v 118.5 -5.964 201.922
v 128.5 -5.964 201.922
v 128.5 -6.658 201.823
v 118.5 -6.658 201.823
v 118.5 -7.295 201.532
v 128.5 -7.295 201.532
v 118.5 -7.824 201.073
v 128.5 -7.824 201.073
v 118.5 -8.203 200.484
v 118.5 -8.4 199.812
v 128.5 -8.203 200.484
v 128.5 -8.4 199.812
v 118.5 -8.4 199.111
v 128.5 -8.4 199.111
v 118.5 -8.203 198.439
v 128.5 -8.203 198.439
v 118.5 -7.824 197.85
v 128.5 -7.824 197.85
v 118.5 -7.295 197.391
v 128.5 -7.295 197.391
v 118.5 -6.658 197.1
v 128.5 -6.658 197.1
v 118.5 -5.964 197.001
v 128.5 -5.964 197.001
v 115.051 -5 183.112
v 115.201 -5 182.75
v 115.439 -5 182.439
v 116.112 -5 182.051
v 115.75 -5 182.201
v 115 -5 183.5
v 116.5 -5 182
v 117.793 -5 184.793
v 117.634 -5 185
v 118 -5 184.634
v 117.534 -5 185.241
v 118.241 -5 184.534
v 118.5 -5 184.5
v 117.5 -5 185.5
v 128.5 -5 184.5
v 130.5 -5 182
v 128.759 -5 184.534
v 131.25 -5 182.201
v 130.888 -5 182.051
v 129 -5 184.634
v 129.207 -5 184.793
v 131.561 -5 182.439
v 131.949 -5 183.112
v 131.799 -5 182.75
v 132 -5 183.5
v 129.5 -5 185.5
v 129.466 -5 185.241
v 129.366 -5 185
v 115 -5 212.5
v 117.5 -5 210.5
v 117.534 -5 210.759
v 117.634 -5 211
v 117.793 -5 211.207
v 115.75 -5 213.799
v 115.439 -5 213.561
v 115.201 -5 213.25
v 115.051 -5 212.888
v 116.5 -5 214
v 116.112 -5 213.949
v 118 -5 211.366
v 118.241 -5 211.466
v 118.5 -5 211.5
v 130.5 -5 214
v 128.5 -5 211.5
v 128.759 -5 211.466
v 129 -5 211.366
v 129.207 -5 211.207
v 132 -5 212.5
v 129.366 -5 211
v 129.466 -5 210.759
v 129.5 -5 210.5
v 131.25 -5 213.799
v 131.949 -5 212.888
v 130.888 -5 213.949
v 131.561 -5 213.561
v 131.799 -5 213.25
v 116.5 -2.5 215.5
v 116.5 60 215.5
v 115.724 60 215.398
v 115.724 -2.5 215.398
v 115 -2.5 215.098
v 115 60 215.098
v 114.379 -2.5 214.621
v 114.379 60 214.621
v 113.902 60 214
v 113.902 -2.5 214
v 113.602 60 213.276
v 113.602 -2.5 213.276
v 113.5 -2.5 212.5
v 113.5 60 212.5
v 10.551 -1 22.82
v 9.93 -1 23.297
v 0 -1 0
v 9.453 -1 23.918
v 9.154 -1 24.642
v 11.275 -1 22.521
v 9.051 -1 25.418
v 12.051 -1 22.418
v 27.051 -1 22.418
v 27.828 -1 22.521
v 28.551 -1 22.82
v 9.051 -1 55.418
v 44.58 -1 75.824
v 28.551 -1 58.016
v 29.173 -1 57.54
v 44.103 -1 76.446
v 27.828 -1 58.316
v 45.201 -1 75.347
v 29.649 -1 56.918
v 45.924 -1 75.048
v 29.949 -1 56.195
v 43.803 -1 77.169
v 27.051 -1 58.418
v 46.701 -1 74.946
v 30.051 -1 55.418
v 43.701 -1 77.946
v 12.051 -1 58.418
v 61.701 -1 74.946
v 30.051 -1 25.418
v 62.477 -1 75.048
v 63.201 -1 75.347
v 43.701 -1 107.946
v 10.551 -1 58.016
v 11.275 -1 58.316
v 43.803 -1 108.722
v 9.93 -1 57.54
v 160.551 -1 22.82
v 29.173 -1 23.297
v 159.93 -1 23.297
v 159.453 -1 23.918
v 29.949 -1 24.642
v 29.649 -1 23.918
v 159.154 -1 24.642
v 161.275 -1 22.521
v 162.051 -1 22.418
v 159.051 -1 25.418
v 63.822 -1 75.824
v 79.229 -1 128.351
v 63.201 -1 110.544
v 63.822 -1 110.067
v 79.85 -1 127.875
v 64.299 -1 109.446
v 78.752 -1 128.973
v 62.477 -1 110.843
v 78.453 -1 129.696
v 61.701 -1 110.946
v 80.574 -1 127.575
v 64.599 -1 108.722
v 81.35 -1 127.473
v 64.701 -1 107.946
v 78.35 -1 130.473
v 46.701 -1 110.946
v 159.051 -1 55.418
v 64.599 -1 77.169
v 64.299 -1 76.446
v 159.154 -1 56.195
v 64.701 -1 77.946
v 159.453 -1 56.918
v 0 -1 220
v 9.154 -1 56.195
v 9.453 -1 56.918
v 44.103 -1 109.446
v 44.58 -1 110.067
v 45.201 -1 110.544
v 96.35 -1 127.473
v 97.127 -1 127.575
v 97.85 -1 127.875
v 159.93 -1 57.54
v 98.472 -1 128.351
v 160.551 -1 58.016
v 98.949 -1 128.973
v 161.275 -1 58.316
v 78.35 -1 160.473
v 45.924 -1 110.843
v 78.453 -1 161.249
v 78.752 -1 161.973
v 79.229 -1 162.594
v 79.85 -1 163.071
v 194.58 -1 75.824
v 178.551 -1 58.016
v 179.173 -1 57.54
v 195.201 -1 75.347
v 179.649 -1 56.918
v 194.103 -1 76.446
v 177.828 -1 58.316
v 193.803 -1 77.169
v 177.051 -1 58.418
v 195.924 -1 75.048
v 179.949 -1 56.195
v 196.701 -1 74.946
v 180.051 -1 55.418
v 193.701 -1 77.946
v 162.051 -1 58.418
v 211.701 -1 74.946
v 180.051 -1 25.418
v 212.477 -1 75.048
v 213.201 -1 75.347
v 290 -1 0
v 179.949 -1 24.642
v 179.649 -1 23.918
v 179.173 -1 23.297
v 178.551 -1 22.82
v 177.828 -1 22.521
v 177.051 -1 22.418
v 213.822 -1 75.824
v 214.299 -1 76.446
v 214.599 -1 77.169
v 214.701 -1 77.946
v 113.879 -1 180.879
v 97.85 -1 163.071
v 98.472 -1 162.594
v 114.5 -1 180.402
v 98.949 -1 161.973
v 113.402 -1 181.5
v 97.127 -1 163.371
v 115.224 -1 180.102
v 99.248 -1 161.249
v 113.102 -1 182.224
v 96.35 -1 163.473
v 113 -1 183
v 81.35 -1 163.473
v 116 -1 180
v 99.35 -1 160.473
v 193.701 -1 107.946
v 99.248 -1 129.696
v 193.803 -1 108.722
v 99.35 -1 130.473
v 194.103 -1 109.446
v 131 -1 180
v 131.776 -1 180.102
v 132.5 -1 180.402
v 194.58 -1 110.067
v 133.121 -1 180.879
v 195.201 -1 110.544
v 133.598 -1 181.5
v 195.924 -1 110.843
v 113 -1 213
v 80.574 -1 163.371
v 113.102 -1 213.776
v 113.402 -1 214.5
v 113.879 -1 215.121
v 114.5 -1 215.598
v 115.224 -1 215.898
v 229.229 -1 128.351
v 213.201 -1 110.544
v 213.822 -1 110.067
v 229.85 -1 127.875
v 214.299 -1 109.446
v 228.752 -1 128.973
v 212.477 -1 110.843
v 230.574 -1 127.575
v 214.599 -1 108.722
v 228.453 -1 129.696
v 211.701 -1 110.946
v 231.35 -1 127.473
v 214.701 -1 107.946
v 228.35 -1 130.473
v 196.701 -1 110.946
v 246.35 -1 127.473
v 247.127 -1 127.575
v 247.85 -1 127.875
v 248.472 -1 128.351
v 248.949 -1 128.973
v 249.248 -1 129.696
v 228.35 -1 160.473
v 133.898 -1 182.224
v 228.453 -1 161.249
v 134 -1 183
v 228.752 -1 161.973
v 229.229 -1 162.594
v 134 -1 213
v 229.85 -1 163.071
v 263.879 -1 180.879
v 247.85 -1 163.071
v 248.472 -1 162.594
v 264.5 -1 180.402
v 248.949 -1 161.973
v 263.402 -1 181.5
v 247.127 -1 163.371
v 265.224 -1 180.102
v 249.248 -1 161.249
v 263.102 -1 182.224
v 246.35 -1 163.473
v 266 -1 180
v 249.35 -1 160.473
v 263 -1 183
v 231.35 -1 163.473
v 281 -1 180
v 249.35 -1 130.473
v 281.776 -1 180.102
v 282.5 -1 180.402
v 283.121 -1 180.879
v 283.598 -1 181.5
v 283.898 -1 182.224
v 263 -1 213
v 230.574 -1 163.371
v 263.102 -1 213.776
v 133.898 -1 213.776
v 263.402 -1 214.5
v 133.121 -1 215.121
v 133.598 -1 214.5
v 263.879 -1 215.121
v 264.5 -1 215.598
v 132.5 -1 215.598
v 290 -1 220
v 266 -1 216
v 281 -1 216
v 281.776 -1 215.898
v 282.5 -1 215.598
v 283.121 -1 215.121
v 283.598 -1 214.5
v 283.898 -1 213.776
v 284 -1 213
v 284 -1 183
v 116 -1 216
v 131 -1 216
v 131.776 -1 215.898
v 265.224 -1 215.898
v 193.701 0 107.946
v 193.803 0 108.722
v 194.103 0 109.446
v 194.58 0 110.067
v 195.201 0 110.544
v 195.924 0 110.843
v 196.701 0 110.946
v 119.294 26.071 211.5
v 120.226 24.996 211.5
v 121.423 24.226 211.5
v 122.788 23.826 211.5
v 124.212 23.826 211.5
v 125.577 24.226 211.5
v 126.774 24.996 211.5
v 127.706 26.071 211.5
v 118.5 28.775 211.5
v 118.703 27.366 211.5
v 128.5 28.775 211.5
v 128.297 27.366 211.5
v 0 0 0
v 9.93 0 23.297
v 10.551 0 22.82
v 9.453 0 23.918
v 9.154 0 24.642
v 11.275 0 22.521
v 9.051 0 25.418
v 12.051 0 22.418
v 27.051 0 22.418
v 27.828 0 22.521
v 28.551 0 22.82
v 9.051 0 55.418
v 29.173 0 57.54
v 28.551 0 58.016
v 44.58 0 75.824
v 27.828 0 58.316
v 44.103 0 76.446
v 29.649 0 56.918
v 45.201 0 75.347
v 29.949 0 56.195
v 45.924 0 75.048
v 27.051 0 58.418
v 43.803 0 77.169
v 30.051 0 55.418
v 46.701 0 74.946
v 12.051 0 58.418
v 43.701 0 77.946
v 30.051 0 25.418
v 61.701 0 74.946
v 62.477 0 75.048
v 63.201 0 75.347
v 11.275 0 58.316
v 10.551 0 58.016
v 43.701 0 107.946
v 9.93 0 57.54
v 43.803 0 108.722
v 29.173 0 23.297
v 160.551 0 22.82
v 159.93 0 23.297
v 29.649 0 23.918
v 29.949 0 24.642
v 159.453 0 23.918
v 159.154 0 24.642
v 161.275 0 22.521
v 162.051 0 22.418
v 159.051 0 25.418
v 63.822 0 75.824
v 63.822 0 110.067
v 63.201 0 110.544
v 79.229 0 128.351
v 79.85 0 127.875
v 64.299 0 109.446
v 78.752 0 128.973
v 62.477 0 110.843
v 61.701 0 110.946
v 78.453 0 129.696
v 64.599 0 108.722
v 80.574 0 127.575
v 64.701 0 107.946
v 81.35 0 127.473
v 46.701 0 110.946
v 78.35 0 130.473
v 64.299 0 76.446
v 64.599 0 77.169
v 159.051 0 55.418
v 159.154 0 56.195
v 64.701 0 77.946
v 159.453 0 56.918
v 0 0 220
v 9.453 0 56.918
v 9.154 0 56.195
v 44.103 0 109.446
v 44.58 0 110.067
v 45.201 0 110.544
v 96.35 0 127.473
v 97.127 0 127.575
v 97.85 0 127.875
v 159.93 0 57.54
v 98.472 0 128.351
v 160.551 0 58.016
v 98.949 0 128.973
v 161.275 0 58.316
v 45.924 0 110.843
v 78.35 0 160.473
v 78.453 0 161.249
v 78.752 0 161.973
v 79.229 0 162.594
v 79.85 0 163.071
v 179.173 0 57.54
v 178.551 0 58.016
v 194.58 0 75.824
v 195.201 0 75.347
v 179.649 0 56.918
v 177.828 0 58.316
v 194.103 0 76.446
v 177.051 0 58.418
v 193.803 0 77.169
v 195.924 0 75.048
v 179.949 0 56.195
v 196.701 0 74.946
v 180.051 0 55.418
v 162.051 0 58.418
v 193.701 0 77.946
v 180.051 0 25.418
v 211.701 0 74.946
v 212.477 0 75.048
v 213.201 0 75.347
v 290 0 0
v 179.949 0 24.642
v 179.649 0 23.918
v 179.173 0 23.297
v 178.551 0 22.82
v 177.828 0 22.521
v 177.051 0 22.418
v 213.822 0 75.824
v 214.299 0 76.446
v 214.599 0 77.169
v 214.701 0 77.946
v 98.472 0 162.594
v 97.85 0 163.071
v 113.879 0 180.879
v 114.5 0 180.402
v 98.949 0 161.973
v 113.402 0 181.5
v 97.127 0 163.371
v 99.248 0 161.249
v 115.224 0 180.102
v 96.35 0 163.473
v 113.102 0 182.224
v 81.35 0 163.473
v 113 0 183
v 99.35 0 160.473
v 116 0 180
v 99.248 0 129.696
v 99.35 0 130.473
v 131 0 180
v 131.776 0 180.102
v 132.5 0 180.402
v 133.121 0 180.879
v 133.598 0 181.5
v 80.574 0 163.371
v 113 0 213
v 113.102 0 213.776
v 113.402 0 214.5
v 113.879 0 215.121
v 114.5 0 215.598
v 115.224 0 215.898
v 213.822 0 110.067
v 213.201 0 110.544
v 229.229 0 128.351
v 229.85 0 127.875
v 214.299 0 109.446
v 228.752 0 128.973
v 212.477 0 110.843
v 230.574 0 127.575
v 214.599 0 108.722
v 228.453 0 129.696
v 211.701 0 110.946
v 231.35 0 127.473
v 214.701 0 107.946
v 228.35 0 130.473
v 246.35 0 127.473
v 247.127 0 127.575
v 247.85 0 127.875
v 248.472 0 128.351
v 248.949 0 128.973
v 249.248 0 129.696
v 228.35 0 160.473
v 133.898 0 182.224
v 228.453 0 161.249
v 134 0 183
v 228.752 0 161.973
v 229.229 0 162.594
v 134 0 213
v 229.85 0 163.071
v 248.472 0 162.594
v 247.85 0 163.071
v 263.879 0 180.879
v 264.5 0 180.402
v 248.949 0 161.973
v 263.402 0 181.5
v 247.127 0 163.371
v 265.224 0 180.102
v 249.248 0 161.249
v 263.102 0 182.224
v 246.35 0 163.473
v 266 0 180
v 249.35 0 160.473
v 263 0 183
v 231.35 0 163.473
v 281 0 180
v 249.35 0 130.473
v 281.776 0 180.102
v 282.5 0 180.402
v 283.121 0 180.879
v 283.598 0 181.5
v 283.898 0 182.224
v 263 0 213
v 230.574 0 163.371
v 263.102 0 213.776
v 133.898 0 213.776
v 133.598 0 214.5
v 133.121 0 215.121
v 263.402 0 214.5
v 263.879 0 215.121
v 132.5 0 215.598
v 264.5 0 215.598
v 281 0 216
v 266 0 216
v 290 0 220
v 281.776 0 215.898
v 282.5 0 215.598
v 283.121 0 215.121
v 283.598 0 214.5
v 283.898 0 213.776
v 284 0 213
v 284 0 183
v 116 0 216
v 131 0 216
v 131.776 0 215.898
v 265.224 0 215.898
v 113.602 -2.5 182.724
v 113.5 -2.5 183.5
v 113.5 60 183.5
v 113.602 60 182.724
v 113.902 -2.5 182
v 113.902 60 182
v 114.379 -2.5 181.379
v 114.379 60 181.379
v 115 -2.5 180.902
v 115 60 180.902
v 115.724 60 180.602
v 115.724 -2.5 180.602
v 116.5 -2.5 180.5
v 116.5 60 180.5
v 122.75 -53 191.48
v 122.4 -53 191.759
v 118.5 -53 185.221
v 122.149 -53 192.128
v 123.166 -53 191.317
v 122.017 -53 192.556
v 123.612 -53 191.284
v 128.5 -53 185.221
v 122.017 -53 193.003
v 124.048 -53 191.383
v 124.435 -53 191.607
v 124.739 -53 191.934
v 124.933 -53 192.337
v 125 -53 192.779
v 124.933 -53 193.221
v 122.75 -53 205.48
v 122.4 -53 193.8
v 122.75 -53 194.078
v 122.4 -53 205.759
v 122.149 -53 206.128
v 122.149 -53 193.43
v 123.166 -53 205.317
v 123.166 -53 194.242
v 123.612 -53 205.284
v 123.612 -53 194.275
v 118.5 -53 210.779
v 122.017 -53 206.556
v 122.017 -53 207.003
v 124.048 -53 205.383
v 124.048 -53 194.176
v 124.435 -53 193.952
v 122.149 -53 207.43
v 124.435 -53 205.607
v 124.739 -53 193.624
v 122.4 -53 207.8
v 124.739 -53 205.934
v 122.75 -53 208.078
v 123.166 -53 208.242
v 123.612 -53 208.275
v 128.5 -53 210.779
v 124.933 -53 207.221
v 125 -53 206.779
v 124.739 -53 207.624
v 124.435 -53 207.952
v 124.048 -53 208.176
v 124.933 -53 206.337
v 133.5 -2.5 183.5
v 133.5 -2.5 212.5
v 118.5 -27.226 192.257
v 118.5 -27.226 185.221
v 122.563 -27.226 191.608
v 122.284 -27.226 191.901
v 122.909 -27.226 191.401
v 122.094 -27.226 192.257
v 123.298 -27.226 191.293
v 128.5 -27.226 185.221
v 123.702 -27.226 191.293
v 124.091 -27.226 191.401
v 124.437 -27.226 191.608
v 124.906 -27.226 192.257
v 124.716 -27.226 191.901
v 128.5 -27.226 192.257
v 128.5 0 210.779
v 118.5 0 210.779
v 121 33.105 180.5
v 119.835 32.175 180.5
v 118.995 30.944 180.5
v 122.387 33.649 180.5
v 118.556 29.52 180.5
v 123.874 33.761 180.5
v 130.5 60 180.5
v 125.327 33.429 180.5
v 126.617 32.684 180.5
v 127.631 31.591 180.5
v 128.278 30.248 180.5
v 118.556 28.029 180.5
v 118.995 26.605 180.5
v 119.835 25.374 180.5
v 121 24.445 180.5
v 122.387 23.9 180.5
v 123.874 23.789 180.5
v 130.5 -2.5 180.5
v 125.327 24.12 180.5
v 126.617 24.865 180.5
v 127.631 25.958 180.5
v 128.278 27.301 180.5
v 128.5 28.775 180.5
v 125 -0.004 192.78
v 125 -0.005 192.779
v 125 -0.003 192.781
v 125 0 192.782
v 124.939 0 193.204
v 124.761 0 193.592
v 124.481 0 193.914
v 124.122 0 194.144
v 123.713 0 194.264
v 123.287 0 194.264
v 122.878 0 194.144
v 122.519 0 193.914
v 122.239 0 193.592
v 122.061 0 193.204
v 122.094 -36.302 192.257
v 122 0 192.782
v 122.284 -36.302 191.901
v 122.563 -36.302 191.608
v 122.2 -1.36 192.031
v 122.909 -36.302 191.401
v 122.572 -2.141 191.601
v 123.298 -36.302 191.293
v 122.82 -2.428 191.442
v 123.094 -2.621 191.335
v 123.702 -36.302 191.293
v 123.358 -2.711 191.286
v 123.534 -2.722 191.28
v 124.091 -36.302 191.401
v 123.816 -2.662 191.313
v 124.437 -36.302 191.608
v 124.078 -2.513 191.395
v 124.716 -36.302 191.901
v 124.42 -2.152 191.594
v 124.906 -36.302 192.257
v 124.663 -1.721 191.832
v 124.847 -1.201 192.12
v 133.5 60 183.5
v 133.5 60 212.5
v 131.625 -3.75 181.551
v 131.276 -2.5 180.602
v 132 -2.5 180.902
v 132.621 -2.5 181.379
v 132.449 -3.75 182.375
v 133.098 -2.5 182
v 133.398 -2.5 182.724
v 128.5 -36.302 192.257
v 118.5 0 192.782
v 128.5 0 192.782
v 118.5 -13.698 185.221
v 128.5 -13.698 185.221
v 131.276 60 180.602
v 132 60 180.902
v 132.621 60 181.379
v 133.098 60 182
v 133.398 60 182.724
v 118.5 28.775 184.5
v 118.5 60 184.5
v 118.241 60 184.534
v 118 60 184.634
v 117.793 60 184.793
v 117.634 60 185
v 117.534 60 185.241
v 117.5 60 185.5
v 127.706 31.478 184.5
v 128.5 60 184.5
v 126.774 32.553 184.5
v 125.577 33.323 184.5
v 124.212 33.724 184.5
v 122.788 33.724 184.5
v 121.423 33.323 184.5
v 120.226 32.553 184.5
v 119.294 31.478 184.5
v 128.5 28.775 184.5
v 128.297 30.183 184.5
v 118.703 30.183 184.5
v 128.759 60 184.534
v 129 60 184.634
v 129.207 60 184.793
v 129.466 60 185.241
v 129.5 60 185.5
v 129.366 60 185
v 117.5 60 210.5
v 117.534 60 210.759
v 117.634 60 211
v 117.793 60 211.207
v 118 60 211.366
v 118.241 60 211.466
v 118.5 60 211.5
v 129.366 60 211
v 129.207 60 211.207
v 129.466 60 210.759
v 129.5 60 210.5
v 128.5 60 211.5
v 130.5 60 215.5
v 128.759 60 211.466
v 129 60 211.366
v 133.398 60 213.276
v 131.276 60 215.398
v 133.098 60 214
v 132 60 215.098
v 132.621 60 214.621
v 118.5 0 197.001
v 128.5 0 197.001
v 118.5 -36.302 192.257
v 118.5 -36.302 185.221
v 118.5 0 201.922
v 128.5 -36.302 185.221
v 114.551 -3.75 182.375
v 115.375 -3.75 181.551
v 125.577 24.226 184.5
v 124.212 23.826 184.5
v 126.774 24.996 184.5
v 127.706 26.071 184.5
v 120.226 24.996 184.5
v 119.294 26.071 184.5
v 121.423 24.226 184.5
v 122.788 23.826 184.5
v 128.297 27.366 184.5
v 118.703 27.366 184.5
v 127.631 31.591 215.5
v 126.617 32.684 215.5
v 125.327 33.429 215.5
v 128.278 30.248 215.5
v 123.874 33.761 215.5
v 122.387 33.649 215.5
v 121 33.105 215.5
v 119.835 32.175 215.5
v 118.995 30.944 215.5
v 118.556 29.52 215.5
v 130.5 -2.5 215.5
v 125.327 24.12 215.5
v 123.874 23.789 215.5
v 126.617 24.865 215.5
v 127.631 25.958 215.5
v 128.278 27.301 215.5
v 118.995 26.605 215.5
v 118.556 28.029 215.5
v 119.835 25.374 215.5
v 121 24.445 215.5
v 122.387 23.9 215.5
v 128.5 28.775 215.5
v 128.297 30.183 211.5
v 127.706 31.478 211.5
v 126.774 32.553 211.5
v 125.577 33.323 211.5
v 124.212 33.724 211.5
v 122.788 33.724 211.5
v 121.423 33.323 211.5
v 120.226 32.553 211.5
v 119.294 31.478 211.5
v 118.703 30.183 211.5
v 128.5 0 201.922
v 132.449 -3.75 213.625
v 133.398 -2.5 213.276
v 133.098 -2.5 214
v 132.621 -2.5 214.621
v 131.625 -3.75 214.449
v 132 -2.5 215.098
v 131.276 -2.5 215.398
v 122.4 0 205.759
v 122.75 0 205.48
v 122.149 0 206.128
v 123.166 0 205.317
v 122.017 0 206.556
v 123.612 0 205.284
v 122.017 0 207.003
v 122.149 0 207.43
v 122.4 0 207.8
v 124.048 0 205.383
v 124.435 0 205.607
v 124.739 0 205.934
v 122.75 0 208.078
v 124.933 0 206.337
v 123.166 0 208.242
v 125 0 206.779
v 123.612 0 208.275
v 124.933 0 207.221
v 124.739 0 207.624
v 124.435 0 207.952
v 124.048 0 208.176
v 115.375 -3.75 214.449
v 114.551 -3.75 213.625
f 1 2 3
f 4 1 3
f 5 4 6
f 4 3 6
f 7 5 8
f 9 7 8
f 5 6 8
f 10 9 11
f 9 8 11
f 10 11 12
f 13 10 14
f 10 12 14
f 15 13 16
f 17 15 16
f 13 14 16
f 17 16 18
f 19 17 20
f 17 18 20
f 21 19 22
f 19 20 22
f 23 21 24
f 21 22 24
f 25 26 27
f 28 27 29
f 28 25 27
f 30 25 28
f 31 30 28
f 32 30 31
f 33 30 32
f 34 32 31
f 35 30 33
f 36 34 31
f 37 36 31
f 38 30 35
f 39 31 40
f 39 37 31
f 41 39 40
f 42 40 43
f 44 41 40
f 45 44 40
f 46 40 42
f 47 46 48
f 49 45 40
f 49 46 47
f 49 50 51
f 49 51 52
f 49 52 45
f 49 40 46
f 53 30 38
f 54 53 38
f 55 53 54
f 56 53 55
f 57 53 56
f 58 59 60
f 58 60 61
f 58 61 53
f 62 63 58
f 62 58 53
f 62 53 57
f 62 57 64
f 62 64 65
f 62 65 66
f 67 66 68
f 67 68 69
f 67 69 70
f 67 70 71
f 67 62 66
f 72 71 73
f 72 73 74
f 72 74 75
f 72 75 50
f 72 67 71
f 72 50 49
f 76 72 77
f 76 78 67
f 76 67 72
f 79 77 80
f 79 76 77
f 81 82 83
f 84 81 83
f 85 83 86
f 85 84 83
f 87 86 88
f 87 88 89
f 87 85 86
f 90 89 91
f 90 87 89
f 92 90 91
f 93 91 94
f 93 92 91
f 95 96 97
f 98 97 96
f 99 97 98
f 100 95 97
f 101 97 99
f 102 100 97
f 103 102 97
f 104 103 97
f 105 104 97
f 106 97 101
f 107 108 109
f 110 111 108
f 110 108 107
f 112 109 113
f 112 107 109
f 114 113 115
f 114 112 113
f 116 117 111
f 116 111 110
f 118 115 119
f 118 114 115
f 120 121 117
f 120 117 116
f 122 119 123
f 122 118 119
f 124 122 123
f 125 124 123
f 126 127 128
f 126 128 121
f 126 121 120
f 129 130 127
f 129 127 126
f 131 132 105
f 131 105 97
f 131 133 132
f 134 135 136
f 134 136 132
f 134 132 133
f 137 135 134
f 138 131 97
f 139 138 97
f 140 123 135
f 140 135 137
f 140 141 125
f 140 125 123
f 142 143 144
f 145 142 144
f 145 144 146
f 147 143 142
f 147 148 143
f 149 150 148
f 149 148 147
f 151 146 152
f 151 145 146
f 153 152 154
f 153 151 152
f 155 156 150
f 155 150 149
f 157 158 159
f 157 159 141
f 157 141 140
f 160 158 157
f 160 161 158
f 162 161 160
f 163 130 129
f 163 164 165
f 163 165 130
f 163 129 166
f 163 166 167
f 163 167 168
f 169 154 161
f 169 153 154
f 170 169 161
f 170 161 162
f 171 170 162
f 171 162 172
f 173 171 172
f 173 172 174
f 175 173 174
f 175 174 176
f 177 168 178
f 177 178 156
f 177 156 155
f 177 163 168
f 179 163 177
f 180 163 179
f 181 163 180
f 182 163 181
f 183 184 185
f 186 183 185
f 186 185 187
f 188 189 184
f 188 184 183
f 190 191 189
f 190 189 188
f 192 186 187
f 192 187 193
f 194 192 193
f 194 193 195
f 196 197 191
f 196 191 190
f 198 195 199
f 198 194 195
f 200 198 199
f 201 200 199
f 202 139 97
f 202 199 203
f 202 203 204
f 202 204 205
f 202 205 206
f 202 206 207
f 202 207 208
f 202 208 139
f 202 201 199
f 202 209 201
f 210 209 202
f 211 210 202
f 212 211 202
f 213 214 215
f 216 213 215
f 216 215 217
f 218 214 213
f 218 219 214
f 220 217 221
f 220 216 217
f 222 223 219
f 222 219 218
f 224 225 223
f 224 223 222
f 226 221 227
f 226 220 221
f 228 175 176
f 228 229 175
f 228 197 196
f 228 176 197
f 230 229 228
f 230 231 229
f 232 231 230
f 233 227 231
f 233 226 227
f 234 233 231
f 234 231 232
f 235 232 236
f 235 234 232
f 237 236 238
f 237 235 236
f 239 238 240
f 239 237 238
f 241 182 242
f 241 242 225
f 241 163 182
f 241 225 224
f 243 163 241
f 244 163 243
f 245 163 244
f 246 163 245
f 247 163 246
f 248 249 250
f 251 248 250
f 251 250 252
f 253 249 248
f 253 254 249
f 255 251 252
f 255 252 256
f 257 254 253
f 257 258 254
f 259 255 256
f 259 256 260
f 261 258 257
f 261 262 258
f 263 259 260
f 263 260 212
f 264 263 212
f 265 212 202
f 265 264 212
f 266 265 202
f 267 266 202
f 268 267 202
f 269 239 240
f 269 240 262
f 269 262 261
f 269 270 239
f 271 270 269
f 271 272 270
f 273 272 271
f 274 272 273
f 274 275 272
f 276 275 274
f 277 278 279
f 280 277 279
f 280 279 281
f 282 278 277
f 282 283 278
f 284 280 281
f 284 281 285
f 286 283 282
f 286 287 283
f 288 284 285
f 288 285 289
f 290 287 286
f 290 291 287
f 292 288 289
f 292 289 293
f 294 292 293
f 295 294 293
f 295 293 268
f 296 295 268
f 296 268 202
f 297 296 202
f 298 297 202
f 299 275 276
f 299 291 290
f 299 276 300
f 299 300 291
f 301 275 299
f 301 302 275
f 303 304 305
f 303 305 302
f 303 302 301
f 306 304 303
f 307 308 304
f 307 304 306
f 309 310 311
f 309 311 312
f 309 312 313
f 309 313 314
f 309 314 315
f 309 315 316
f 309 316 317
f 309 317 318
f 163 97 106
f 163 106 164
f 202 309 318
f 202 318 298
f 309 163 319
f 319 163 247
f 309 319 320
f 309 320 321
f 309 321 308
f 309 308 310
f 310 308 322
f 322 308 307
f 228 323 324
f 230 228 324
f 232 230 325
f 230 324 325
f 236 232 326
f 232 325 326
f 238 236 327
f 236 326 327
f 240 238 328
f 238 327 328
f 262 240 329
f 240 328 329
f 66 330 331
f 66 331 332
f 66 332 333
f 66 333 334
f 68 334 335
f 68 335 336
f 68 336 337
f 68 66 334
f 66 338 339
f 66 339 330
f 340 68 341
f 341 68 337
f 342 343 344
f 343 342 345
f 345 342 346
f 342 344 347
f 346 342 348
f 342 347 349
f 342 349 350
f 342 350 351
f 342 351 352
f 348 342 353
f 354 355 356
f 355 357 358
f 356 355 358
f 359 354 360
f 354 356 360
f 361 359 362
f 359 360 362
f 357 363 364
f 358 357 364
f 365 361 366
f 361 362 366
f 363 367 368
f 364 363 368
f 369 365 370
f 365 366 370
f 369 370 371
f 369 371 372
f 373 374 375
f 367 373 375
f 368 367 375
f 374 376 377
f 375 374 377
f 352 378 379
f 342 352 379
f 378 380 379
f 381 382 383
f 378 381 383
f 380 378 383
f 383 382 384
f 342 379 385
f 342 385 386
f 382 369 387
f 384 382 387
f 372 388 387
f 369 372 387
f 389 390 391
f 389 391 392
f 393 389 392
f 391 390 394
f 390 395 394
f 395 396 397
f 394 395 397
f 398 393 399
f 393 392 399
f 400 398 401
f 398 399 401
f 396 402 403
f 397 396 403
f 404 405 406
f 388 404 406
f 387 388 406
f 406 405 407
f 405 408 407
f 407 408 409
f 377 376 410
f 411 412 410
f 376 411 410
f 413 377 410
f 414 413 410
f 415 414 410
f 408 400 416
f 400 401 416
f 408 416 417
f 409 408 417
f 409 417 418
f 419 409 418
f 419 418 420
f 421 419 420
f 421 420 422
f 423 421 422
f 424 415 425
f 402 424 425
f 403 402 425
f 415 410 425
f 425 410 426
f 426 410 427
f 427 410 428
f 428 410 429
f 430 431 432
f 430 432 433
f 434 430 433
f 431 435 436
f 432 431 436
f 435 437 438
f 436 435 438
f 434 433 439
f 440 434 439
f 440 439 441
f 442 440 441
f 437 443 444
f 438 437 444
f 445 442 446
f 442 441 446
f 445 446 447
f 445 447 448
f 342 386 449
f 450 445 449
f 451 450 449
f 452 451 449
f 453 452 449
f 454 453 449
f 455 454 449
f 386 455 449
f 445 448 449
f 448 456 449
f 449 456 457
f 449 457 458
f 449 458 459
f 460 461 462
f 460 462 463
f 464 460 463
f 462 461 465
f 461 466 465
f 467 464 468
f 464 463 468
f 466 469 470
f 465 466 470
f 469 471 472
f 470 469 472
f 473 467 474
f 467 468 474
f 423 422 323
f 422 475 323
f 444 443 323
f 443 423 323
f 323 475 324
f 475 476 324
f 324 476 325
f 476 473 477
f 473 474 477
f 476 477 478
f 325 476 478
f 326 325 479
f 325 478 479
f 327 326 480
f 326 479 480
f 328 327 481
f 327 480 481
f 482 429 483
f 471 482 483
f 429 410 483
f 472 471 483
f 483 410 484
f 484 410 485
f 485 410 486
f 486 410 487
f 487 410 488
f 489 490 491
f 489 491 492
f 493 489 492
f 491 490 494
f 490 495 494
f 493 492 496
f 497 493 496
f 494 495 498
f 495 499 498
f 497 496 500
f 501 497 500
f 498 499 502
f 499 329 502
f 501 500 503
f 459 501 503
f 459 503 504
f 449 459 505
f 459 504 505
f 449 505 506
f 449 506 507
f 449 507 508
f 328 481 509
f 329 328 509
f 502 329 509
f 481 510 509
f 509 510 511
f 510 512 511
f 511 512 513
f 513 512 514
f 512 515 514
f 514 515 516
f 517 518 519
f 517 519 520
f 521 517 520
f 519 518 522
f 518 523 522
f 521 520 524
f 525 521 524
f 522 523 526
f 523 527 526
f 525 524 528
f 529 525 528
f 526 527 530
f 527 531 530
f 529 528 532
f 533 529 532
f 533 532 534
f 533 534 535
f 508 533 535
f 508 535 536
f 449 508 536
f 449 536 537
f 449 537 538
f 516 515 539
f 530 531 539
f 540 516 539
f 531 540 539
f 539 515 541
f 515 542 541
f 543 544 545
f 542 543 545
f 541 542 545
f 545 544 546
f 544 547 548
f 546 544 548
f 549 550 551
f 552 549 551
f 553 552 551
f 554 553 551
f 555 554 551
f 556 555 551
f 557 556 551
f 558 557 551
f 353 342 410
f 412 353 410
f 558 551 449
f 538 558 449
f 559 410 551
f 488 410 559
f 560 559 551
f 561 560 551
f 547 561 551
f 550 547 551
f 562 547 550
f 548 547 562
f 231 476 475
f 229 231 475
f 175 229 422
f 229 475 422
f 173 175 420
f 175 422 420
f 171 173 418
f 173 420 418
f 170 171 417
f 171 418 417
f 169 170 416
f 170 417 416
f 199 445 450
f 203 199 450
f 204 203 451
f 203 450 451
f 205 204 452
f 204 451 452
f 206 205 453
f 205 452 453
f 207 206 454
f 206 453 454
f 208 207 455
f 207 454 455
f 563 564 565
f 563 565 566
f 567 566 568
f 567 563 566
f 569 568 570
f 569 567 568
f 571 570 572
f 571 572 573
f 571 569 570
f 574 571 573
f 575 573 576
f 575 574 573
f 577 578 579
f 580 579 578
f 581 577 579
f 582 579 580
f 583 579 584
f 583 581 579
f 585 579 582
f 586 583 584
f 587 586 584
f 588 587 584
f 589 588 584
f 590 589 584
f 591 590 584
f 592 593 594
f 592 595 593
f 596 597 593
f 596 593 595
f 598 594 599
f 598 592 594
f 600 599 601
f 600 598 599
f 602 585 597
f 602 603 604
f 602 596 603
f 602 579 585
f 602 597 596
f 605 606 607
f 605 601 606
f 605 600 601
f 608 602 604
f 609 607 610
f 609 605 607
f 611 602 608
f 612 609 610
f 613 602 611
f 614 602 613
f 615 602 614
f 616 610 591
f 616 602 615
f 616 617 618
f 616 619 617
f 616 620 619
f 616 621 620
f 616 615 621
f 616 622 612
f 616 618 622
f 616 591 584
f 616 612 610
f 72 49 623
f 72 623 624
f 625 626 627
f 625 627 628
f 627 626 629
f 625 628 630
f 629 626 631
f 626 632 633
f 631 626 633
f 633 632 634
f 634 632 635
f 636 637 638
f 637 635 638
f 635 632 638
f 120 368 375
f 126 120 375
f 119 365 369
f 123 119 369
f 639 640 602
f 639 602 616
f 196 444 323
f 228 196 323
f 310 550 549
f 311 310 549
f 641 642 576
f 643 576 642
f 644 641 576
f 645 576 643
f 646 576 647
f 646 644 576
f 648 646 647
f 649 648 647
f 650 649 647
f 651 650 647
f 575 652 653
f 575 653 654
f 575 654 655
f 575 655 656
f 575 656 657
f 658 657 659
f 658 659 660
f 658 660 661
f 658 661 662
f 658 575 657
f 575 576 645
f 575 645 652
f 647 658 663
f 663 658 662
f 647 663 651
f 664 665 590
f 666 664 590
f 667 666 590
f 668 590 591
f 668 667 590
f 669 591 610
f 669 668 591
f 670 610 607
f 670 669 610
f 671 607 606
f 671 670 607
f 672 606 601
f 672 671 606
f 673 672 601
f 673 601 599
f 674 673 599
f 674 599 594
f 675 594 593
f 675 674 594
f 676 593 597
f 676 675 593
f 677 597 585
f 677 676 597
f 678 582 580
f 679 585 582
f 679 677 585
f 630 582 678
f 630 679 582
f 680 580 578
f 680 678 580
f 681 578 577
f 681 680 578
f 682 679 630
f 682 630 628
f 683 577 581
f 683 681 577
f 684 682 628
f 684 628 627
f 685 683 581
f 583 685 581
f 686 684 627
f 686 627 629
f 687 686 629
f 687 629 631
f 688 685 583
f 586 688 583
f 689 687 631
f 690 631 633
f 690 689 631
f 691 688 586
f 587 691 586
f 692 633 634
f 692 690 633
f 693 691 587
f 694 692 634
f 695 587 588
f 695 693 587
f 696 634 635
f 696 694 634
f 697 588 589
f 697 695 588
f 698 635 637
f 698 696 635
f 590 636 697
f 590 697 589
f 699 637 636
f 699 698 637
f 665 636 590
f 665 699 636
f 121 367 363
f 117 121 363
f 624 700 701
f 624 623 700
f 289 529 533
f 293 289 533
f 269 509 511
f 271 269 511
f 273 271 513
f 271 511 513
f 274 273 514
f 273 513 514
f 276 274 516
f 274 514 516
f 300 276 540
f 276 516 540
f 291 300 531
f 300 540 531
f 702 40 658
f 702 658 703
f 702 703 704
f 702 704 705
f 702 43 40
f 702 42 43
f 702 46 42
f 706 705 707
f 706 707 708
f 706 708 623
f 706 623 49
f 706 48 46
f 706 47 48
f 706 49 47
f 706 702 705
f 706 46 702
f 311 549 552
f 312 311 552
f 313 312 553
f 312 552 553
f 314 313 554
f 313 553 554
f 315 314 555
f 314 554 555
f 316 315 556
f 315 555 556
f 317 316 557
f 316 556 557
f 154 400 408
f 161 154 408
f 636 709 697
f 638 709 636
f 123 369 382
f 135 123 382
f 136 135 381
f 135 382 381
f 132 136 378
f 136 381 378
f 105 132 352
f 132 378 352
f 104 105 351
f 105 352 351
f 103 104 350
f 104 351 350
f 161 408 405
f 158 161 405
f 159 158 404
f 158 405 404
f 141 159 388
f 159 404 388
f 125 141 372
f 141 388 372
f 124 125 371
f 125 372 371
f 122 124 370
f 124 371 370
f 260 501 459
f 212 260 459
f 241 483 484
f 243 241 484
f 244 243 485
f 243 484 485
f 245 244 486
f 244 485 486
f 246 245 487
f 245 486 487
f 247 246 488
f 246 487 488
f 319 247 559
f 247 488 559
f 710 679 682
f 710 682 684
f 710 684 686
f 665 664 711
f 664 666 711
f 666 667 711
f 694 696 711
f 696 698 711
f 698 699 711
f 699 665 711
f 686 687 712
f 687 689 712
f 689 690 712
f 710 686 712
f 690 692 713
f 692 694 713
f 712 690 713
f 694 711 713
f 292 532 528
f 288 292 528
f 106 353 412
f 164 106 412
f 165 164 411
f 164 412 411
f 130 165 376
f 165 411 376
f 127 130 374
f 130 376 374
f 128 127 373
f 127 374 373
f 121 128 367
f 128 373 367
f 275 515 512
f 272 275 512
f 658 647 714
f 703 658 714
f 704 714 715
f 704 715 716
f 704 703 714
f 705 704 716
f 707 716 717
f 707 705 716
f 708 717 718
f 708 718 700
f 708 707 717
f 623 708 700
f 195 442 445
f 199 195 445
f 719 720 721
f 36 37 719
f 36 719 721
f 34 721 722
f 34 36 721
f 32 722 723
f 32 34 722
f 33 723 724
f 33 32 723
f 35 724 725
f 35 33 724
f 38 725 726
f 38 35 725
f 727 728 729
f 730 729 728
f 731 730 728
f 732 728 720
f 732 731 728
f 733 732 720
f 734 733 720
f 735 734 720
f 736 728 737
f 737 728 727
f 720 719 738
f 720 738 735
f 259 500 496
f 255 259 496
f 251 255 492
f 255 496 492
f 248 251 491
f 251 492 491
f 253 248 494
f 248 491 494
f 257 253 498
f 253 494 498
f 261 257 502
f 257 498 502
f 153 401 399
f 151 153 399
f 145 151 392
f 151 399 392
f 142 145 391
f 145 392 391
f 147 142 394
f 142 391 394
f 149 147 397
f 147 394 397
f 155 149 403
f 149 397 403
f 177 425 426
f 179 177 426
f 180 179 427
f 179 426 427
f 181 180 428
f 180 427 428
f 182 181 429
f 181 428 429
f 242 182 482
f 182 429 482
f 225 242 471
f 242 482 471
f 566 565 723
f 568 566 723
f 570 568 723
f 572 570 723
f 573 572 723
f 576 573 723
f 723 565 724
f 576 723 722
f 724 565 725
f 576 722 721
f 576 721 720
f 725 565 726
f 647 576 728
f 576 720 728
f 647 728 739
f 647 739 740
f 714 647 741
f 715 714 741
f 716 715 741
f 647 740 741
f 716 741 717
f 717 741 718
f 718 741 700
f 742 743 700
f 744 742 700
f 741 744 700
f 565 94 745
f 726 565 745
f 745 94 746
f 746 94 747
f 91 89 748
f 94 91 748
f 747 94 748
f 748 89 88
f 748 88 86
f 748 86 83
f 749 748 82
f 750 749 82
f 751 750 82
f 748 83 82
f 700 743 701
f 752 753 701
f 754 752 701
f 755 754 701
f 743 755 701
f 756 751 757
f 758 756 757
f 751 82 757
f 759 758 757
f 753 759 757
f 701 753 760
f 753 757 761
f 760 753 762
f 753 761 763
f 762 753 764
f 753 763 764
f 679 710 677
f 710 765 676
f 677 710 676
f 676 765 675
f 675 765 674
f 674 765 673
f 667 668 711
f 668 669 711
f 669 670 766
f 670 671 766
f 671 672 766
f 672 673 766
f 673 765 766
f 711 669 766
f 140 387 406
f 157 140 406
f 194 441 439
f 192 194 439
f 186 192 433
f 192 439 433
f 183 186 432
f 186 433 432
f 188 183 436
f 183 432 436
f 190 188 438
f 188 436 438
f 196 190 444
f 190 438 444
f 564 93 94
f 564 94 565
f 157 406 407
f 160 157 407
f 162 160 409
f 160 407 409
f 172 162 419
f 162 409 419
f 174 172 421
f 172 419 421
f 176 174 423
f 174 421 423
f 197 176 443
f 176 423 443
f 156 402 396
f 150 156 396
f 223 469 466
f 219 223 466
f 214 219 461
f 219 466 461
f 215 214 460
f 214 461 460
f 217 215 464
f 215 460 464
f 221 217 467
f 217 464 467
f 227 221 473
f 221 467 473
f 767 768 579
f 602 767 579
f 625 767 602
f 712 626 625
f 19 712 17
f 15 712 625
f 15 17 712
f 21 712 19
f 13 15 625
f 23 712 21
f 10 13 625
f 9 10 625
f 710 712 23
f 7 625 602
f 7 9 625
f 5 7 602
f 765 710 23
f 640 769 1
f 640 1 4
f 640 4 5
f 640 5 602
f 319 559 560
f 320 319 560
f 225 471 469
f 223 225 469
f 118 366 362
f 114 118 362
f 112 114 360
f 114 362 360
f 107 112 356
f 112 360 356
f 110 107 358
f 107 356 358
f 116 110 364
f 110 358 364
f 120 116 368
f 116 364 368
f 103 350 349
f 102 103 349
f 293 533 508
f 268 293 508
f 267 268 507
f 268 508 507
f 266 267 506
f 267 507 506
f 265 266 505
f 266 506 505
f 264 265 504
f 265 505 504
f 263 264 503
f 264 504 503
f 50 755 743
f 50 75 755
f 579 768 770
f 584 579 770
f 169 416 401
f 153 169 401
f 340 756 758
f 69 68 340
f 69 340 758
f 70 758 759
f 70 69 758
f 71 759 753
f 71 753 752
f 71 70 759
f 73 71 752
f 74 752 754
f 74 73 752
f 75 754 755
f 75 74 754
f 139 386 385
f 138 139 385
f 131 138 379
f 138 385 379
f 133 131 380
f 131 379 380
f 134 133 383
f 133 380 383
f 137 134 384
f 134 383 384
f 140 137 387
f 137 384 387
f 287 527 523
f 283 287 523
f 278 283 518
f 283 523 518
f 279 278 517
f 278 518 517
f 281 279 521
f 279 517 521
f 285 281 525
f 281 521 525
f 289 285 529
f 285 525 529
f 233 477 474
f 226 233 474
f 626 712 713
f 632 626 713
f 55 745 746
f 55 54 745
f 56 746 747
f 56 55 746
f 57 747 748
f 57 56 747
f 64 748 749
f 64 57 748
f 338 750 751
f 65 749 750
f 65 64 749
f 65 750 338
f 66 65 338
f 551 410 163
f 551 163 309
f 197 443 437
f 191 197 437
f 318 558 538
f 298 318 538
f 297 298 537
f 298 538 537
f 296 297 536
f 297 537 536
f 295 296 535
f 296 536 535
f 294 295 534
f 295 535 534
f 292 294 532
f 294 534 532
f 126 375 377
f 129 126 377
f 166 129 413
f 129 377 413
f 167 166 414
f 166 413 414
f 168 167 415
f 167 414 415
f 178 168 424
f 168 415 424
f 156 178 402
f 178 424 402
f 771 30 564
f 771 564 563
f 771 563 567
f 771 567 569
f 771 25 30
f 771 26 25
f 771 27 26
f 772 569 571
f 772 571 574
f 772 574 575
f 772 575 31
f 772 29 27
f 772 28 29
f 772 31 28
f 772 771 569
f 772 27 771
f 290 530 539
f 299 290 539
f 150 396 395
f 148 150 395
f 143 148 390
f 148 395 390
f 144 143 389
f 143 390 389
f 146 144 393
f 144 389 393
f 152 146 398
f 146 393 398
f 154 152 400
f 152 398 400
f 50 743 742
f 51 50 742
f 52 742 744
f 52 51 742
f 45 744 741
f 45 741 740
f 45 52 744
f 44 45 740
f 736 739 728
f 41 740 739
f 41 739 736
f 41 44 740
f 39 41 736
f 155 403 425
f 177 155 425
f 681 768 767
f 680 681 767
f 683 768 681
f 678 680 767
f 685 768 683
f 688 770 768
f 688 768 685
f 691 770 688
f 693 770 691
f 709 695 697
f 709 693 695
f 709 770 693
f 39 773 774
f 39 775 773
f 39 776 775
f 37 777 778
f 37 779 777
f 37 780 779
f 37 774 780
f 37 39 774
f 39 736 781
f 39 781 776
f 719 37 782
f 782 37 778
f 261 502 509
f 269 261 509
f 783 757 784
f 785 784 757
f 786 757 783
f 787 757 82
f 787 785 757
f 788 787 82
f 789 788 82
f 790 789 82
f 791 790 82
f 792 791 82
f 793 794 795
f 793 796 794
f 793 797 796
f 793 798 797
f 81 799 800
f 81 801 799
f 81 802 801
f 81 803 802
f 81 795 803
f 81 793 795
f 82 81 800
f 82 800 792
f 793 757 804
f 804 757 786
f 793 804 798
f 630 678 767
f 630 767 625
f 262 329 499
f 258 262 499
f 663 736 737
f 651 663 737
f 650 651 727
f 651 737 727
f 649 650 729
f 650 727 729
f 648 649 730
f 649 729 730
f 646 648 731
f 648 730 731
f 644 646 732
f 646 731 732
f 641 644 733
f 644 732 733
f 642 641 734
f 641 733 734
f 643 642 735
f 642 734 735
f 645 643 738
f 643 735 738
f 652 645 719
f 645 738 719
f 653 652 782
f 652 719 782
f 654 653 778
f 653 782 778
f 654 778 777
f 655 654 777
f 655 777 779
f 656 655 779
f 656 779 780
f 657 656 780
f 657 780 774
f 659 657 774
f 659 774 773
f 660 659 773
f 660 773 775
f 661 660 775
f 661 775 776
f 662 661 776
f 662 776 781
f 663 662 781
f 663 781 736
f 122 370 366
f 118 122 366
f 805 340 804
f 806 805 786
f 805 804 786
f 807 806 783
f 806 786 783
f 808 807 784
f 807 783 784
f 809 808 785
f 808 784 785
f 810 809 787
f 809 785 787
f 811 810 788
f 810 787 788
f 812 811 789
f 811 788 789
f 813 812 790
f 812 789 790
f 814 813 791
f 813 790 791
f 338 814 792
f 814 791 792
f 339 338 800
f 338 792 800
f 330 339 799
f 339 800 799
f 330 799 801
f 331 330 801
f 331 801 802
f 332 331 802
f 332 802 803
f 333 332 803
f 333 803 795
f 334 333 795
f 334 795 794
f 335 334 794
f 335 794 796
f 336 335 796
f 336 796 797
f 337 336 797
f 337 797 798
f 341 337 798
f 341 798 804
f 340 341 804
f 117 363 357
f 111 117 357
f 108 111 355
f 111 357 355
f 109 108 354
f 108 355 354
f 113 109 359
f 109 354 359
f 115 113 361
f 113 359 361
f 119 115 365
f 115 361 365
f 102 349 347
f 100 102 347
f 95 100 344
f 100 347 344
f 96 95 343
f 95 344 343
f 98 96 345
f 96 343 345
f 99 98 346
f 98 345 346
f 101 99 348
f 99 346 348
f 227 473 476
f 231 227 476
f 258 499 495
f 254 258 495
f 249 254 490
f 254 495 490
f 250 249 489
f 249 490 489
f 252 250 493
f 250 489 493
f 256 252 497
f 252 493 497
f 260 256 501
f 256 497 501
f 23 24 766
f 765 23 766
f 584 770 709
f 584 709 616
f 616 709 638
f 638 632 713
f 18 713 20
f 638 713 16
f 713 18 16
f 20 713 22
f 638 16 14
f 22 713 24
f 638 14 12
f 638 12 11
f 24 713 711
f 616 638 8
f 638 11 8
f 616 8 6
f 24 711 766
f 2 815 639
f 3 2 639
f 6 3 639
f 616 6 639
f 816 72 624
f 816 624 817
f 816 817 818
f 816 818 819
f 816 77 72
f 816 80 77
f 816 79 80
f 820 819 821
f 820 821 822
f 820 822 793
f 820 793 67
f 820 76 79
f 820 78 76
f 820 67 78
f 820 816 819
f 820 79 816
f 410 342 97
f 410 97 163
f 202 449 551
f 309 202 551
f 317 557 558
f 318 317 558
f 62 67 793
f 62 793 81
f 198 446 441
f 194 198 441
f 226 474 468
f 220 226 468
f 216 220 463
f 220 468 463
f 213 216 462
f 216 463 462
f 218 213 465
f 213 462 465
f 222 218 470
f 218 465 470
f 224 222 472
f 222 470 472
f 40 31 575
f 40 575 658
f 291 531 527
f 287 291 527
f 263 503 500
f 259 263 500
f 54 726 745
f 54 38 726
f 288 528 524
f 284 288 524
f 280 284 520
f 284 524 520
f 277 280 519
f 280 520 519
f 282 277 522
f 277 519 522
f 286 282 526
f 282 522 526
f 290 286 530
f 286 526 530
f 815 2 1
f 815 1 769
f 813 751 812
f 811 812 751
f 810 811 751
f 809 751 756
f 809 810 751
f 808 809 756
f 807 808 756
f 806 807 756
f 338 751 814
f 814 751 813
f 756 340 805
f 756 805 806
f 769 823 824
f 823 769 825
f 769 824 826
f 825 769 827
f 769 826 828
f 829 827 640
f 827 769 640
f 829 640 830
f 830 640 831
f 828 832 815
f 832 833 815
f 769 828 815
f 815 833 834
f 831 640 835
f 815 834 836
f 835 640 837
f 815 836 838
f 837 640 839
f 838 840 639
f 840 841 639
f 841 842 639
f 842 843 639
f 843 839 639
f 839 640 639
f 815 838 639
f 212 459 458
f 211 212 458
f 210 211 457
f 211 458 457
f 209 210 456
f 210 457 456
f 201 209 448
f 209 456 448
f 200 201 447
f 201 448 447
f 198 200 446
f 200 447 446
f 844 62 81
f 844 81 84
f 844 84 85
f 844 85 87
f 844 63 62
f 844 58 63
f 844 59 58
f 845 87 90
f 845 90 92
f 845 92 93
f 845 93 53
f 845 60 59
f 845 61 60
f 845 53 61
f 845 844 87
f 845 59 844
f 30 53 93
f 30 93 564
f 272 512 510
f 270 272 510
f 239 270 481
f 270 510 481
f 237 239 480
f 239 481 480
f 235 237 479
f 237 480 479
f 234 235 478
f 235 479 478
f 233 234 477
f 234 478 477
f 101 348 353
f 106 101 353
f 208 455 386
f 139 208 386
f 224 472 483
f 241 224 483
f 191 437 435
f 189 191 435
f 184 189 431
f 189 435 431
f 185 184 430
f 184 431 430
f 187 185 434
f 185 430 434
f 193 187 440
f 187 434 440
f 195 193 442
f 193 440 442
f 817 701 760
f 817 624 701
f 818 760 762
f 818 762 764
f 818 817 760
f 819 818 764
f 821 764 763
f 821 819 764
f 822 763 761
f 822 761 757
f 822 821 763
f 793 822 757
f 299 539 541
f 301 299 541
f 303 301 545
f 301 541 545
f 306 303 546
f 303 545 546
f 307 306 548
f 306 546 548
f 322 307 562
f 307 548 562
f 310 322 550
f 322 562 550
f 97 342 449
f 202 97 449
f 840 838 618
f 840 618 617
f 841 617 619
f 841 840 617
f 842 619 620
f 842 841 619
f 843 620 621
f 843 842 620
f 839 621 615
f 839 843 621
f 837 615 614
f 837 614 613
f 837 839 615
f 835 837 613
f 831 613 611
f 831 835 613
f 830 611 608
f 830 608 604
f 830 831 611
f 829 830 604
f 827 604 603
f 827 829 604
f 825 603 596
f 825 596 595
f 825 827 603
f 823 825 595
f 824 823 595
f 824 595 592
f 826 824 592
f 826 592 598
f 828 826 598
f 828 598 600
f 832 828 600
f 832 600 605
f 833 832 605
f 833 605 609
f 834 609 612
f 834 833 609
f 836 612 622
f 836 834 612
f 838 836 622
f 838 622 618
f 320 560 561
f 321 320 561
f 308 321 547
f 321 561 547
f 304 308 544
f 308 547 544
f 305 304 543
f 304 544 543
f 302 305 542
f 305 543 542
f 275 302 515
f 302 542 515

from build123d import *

# Parameters (mm, degrees)
F0_W      = 290
F0_H      = 220
F1_DEPTH  = 1
F3_DEPTH  = 5
F4_SIZE2  = 1.5
F4_SIZE   = 2.5
F5_DEPTH  = 60
F6_R      = 5
F7_DEPTH  = 35
F11_W     = 10
F11_H     = 25.5586259929
F11_R     = 1.5
F8_DEPTH  = 53
F9_W      = 9.0754777193
F9_H      = 7.0361659809
F9_W_2    = 5.9644267894
F9_H_2    = 4.9215108156
F10_DEPTH = 10


with BuildPart() as f1:
    # F0 (on Front) → F1 (new body)
    with BuildSketch(Plane.XZ):
        with Locations((145, 110)):
            Rectangle(F0_W, F0_H)
        with BuildLine():
            ThreePointArc((27.05129, 58.41831), (29.1726103436, 57.5396303436), (30.05129, 55.41831))
            Line((30.05129, 55.41831), (30.05129, 25.41831))
            ThreePointArc((30.05129, 25.41831), (29.1726103436, 23.2969896564), (27.05129, 22.41831))
            Line((27.05129, 22.41831), (12.05129, 22.41831))
            ThreePointArc((12.05129, 22.41831), (9.9299696564, 23.2969896564), (9.05129, 25.41831))
            Line((9.05129, 25.41831), (9.05129, 55.41831))
            ThreePointArc((9.05129, 55.41831), (9.9299696564, 57.5396303436), (12.05129, 58.41831))
            Line((12.05129, 58.41831), (27.05129, 58.41831))
        make_face(mode=Mode.SUBTRACT)
        with BuildLine():
            Line((43.70086, 77.94554), (43.70086, 107.94554))
            ThreePointArc((43.70086, 107.94554), (44.5795396564, 110.0668603436), (46.70086, 110.94554))
            Line((46.70086, 110.94554), (61.70086, 110.94554))
            ThreePointArc((61.70086, 110.94554), (63.8221803436, 110.0668603436), (64.70086, 107.94554))
            Line((64.70086, 107.94554), (64.70086, 77.94554))
            ThreePointArc((64.70086, 77.94554), (63.8221803436, 75.8242196564), (61.70086, 74.94554))
            Line((61.70086, 74.94554), (46.70086, 74.94554))
            ThreePointArc((46.70086, 74.94554), (44.5795396564, 75.8242196564), (43.70086, 77.94554))
        make_face(mode=Mode.SUBTRACT)
        with BuildLine():
            ThreePointArc((177.05129, 58.41831), (179.1726103436, 57.5396303436), (180.05129, 55.41831))
            Line((180.05129, 55.41831), (180.05129, 25.41831))
            ThreePointArc((180.05129, 25.41831), (179.1726103436, 23.2969896564), (177.05129, 22.41831))
            Line((177.05129, 22.41831), (162.05129, 22.41831))
            ThreePointArc((162.05129, 22.41831), (159.9299696564, 23.2969896564), (159.05129, 25.41831))
            Line((159.05129, 25.41831), (159.05129, 55.41831))
            ThreePointArc((159.05129, 55.41831), (159.9299696564, 57.5396303436), (162.05129, 58.41831))
            Line((162.05129, 58.41831), (177.05129, 58.41831))
        make_face(mode=Mode.SUBTRACT)
        with BuildLine():
            ThreePointArc((211.70086, 110.94554), (213.8221803436, 110.0668603436), (214.70086, 107.94554))
            Line((214.70086, 107.94554), (214.70086, 77.94554))
            ThreePointArc((214.70086, 77.94554), (213.8221803436, 75.8242196564), (211.70086, 74.94554))
            Line((211.70086, 74.94554), (196.70086, 74.94554))
            ThreePointArc((196.70086, 74.94554), (194.5795396564, 75.8242196564), (193.70086, 77.94554))
            Line((193.70086, 77.94554), (193.70086, 107.94554))
            ThreePointArc((193.70086, 107.94554), (194.5795396564, 110.0668603436), (196.70086, 110.94554))
            Line((196.70086, 110.94554), (211.70086, 110.94554))
        make_face(mode=Mode.SUBTRACT)
        with BuildLine():
            Line((78.35043, 130.47277), (78.35043, 160.47277))
            ThreePointArc((78.35043, 160.47277), (79.2291096564, 162.5940903436), (81.35043, 163.47277))
            Line((81.35043, 163.47277), (96.35043, 163.47277))
            ThreePointArc((96.35043, 163.47277), (98.4717503436, 162.5940903436), (99.35043, 160.47277))
            Line((99.35043, 160.47277), (99.35043, 130.47277))
            ThreePointArc((99.35043, 130.47277), (98.4717503436, 128.3514496564), (96.35043, 127.47277))
            Line((96.35043, 127.47277), (81.35043, 127.47277))
            ThreePointArc((81.35043, 127.47277), (79.2291096564, 128.3514496564), (78.35043, 130.47277))
        make_face(mode=Mode.SUBTRACT)
        with BuildLine():
            ThreePointArc((113, 213), (113.8786796564, 215.1213203436), (116, 216))
            Line((116, 216), (131, 216))
            ThreePointArc((131, 216), (133.1213203436, 215.1213203436), (134, 213))
            Line((134, 213), (134, 183))
            ThreePointArc((134, 183), (133.1213203436, 180.8786796564), (131, 180))
            Line((131, 180), (116, 180))
            ThreePointArc((116, 180), (113.8786796564, 180.8786796564), (113, 183))
            Line((113, 183), (113, 213))
        make_face(mode=Mode.SUBTRACT)
        with BuildLine():
            ThreePointArc((246.35043, 163.47277), (248.4717503436, 162.5940903436), (249.35043, 160.47277))
            Line((249.35043, 160.47277), (249.35043, 130.47277))
            ThreePointArc((249.35043, 130.47277), (248.4717503436, 128.3514496564), (246.35043, 127.47277))
            Line((246.35043, 127.47277), (231.35043, 127.47277))
            ThreePointArc((231.35043, 127.47277), (229.2291096564, 128.3514496564), (228.35043, 130.47277))
            Line((228.35043, 130.47277), (228.35043, 160.47277))
            ThreePointArc((228.35043, 160.47277), (229.2291096564, 162.5940903436), (231.35043, 163.47277))
            Line((231.35043, 163.47277), (246.35043, 163.47277))
        make_face(mode=Mode.SUBTRACT)
        with BuildLine():
            ThreePointArc((263, 213), (263.8786796564, 215.1213203436), (266, 216))
            Line((266, 216), (281, 216))
            ThreePointArc((281, 216), (283.1213203436, 215.1213203436), (284, 213))
            Line((284, 213), (284, 183))
            ThreePointArc((284, 183), (283.1213203436, 180.8786796564), (281, 180))
            Line((281, 180), (266, 180))
            ThreePointArc((266, 180), (263.8786796564, 180.8786796564), (263, 183))
            Line((263, 183), (263, 213))
        make_face(mode=Mode.SUBTRACT)
    extrude(amount=F1_DEPTH)


with BuildPart() as f3:
    # F2 (on Front) → F3 (new body)
    with BuildSketch(Plane.XZ):
        with BuildLine():
            ThreePointArc((116.5, 215.5), (114.3786796564, 214.6213203436), (113.5, 212.5))
            Line((113.5, 212.5), (113.5, 183.5))
            ThreePointArc((113.5, 183.5), (114.3786796564, 181.3786796564), (116.5, 180.5))
            Line((116.5, 180.5), (130.5, 180.5))
            ThreePointArc((130.5, 180.5), (132.6213203436, 181.3786796564), (133.5, 183.5))
            Line((133.5, 183.5), (133.5, 212.5))
            ThreePointArc((133.5, 212.5), (132.6213203436, 214.6213203436), (130.5, 215.5))
            Line((130.5, 215.5), (116.5, 215.5))
        make_face()
        with BuildLine():
            Line((118.5, 211.5), (128.5, 211.5))
            ThreePointArc((128.5, 211.5), (129.2071067812, 211.2071067812), (129.5, 210.5))
            Line((129.5, 210.5), (129.5, 198))
            Line((129.5, 198), (129.5, 185.5))
            ThreePointArc((129.5, 185.5), (129.2071067812, 184.7928932188), (128.5, 184.5))
            Line((128.5, 184.5), (123.5, 184.5))
            Line((123.5, 184.5), (118.5, 184.5))
            ThreePointArc((118.5, 184.5), (117.7928932188, 184.7928932188), (117.5, 185.5))
            Line((117.5, 185.5), (117.5, 210.5))
            ThreePointArc((117.5, 210.5), (117.7928932188, 211.2071067812), (118.5, 211.5))
        make_face(mode=Mode.SUBTRACT)
    extrude(amount=F3_DEPTH)

    # F4
    f4_edges = [f3.edges().sort_by_distance(p)[0] for p in [
        (133.5, -5, 198),
        (132.62132, -5, 214.62132),
        (123.5, -5, 215.5),
        (114.37868, -5, 214.62132),
        (113.5, -5, 198),
        (114.37868, -5, 181.37868),
        (123.5, -5, 180.5),
        (132.62132, -5, 181.37868),
    ]]
    chamfer(f4_edges, length=F4_SIZE, length2=F4_SIZE2)

    # F5 (add): a face of the model
    f5_faces = [f3.faces().sort_by_distance(p)[0] for p in [
        (114.6637235127, 0, 214.3362764873),
    ]]
    extrude(f5_faces, amount=F5_DEPTH)

    # F6 (on face) → F7 (cut)
    with BuildSketch(Plane.XY.offset(215.5)):
        with Locations((123.5, 28.7746358663)):
            Circle(F6_R)
    extrude(amount=-F7_DEPTH, mode=Mode.SUBTRACT)


with BuildPart() as f8:
    # F11 (on Front) → F8 (new body)
    with BuildSketch(Plane.XZ):
        with Locations((123.5, 198)):
            Rectangle(F11_W, F11_H)
        with Locations((123.5, 192.7793129965)):
            Circle(F11_R, mode=Mode.SUBTRACT)
        with Locations((123.5, 206.7793129965)):
            Circle(F11_R, mode=Mode.SUBTRACT)
    extrude(amount=F8_DEPTH)

    # F9 (on face) → F10 (cut, through all)
    with BuildSketch(Plane.YZ.offset(128.5)):
        with Locations((-31.7641720176, 188.738769994)):
            Rectangle(F9_W, F9_H)
        Polygon((0, 192.7823275328), (-13.698223047, 185.2206870035), (0, 185.2206870035), align=None)
        with Locations((-2.9822133947, 199.4615122676)):
            Rectangle(F9_W_2, F9_H_2)
        with BuildLine():
            Line((-5.9644267894, 197.0007568598), (-5.9644267894, 201.9222676754))
            ThreePointArc((-5.9644267894, 201.9222676754), (-8.4251821972, 199.4615122676), (-5.9644267894, 197.0007568598))
        make_face()
    extrude(amount=-F10_DEPTH, mode=Mode.SUBTRACT)


solid = Compound([f1.part, f3.part, f8.part])
